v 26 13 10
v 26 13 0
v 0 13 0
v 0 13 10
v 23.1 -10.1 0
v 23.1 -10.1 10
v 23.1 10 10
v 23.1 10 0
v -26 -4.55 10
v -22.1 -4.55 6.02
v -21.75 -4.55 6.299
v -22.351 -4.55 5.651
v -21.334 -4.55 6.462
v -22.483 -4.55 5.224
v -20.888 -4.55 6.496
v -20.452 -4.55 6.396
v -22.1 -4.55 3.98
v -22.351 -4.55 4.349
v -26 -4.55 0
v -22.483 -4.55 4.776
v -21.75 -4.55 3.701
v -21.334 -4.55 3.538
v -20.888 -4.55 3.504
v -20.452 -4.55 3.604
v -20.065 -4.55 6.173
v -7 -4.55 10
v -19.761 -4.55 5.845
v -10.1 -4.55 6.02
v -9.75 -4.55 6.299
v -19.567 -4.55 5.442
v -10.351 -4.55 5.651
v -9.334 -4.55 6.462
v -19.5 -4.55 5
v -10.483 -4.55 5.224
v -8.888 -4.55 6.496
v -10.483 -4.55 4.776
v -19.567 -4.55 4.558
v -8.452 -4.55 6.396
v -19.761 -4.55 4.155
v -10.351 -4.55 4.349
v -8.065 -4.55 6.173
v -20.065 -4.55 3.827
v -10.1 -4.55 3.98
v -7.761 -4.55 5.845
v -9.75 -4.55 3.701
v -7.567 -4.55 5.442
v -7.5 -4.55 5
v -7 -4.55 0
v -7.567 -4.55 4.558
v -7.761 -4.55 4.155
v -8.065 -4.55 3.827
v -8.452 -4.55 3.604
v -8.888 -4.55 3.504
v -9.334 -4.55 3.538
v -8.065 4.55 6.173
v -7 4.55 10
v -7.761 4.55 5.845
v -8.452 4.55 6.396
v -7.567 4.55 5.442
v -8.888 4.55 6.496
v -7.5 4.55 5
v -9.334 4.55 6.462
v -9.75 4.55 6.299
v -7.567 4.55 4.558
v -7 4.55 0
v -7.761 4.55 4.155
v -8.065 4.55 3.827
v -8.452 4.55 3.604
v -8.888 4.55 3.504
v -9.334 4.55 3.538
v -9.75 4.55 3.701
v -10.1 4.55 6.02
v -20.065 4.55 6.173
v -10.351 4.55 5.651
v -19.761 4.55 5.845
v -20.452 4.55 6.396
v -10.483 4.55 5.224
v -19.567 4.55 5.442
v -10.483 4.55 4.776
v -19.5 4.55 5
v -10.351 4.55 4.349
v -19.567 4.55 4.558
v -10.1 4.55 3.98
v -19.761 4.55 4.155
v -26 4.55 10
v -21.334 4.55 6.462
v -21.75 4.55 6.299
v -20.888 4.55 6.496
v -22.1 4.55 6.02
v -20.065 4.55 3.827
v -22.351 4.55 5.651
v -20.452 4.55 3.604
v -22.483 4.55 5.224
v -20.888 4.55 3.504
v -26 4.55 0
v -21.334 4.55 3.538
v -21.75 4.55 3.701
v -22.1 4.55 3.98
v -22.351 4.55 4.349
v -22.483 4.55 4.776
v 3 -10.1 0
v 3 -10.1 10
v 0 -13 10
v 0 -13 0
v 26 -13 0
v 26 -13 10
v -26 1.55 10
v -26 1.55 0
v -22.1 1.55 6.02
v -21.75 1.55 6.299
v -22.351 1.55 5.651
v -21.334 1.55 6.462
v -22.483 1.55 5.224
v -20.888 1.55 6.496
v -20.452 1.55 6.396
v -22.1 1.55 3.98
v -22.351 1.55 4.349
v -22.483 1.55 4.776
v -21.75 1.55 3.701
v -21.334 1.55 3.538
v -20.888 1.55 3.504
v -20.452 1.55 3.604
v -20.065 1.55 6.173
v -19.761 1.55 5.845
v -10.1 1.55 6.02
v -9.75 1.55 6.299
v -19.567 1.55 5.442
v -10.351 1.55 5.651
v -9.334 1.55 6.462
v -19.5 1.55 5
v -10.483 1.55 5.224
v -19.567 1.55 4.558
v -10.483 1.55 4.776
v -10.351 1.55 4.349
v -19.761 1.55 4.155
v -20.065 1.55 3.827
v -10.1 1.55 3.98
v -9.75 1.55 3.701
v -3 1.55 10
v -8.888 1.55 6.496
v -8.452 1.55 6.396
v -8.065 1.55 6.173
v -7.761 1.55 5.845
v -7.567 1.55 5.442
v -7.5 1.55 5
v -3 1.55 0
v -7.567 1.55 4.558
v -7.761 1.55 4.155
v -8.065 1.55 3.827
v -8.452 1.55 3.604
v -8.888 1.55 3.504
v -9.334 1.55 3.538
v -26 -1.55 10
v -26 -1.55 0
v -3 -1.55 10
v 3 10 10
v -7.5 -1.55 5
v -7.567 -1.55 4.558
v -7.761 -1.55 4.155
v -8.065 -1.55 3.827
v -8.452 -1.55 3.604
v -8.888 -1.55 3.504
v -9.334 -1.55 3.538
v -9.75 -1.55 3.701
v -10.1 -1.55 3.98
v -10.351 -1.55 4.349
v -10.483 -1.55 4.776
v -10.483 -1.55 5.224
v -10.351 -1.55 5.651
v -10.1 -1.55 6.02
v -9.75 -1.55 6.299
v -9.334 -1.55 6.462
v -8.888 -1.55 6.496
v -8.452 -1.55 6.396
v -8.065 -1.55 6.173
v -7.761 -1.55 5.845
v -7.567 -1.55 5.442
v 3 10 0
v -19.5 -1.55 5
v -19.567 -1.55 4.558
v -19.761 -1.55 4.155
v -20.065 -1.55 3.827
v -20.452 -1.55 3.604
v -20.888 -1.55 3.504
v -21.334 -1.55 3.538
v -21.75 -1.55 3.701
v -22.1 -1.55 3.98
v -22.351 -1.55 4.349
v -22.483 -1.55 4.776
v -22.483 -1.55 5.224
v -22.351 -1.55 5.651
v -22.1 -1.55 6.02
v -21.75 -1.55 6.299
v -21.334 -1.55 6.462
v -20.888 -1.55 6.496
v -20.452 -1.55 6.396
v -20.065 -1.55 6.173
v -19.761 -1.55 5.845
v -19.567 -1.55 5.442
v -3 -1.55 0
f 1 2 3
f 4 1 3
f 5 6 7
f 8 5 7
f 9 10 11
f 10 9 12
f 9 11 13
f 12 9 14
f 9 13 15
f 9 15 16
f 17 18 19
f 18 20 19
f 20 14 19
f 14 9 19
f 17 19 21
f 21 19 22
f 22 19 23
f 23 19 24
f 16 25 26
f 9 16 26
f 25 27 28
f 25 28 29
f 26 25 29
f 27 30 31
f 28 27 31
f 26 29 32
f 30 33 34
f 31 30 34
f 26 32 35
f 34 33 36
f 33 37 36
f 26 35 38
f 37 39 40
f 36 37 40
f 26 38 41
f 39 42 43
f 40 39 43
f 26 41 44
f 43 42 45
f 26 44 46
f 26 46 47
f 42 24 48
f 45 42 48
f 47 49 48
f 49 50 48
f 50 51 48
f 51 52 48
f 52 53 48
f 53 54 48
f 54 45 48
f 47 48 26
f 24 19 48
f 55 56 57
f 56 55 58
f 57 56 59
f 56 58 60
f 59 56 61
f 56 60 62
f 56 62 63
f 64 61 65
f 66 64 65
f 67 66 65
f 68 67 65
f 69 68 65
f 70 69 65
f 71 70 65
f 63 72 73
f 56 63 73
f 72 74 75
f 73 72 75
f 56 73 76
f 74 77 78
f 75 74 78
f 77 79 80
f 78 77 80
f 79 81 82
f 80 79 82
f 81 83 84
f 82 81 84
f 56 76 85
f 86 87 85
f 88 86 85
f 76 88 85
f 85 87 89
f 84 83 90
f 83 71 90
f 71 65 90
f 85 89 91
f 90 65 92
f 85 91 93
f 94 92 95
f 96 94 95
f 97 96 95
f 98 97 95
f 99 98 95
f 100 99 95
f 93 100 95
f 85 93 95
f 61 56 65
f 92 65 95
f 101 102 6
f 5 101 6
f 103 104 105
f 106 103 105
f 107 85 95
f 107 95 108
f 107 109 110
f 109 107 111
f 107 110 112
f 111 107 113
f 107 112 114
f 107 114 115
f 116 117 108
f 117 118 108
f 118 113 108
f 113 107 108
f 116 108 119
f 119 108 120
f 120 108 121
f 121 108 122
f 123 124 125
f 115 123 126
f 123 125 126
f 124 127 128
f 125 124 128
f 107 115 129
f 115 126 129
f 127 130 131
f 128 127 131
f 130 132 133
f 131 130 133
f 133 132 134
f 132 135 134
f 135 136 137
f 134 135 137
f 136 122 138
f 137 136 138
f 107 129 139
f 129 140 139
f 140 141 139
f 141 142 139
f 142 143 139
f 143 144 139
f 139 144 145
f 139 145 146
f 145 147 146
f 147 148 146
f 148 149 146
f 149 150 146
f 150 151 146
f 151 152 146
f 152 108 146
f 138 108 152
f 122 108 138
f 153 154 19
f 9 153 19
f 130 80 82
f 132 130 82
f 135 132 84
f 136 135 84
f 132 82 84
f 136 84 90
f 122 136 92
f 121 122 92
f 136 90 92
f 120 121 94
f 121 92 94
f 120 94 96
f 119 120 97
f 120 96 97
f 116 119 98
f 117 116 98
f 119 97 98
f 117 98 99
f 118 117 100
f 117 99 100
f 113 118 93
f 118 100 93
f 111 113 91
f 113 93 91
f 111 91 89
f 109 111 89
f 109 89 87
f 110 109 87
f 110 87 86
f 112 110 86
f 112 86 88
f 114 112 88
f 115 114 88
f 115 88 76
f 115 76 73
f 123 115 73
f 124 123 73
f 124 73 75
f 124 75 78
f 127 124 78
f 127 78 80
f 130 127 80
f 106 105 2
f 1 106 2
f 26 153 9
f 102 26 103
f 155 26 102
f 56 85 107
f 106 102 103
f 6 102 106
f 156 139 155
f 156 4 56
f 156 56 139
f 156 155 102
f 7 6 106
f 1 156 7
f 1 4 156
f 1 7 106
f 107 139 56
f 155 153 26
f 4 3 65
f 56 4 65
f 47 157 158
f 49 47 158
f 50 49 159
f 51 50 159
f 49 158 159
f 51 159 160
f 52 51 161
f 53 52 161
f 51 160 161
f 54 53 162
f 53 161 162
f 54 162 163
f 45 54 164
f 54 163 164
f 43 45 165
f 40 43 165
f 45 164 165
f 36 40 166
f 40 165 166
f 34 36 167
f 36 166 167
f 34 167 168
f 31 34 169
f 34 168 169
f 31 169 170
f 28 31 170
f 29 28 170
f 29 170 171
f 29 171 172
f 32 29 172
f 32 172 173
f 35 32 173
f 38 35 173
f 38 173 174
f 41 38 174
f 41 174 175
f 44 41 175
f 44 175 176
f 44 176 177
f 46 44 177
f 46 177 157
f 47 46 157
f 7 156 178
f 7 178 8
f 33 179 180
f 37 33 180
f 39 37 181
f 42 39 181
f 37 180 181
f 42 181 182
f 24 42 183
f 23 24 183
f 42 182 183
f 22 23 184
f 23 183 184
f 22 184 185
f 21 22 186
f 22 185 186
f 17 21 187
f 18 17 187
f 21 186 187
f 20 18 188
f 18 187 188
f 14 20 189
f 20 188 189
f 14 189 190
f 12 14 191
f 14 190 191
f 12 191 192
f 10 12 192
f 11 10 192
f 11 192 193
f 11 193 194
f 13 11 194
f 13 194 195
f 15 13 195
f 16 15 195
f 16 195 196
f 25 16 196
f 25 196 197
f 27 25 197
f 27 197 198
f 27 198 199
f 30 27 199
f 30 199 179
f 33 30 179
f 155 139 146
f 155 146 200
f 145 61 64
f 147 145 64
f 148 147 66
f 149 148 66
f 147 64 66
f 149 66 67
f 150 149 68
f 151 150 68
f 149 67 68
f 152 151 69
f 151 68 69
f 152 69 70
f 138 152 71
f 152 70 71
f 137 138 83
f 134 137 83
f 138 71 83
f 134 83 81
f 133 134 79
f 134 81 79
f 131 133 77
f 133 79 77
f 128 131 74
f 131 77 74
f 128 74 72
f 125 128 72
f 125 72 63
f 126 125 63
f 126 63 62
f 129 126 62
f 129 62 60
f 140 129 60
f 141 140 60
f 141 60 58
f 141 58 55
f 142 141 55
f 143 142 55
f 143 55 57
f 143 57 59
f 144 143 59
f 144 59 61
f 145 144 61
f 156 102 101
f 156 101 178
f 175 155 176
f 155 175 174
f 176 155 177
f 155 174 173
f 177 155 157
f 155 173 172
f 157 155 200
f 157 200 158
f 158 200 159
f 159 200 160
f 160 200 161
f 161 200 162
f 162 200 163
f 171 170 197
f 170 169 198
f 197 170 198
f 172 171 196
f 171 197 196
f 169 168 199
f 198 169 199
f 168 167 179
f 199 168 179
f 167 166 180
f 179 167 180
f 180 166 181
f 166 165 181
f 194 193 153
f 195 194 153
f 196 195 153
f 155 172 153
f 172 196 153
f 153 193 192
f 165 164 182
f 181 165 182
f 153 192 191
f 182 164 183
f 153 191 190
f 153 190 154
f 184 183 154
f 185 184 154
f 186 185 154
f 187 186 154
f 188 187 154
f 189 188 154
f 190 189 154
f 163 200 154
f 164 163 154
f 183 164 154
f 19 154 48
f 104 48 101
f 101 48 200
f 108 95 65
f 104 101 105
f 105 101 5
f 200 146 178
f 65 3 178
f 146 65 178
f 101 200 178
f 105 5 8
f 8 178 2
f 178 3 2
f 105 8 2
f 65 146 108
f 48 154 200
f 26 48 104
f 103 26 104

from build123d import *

# Parameters (mm, degrees)
EXTRUDE_1_DEPTH     = 10
SKETCH_5_W          = 20.1
SKETCH_5_H          = 20.1
CUT_EXTRUDE_1_DEPTH = 30
SKETCH_7_R          = 1.5
CUT_EXTRUDE_5_DEPTH = 9.1


with BuildPart() as part:
    # 草图1 → 凸台-拉伸1 (new body)
    with BuildSketch(Plane.XY):
        Polygon((-26, 4.55), (-26, 1.55), (-3, 1.55), (-3, -1.55), (-26, -1.55), (-26, -4.55), (-7, -4.55), (0, -13), (26, -13), (26, 13), (0, 13), (-7, 4.55), align=None)
    extrude(amount=EXTRUDE_1_DEPTH)

    # 草图5 → 切除-拉伸1 (cut)
    with BuildSketch(Plane.XY.offset(10)):
        with Locations((13.05, -0.05)):
            Rectangle(SKETCH_5_W, SKETCH_5_H)
    extrude(amount=-CUT_EXTRUDE_1_DEPTH, mode=Mode.SUBTRACT)

    # 草图7 → 切除-拉伸5 (cut)
    with BuildSketch(Plane(origin=(0, 4.55, 0), x_dir=(1, 0, 0), z_dir=(0, 1, 0))):
        with Locations((-21, -5)):
            Circle(SKETCH_7_R)
        with Locations((-9, -5)):
            Circle(SKETCH_7_R)
    extrude(amount=-CUT_EXTRUDE_5_DEPTH, mode=Mode.SUBTRACT)


solid = part.part
